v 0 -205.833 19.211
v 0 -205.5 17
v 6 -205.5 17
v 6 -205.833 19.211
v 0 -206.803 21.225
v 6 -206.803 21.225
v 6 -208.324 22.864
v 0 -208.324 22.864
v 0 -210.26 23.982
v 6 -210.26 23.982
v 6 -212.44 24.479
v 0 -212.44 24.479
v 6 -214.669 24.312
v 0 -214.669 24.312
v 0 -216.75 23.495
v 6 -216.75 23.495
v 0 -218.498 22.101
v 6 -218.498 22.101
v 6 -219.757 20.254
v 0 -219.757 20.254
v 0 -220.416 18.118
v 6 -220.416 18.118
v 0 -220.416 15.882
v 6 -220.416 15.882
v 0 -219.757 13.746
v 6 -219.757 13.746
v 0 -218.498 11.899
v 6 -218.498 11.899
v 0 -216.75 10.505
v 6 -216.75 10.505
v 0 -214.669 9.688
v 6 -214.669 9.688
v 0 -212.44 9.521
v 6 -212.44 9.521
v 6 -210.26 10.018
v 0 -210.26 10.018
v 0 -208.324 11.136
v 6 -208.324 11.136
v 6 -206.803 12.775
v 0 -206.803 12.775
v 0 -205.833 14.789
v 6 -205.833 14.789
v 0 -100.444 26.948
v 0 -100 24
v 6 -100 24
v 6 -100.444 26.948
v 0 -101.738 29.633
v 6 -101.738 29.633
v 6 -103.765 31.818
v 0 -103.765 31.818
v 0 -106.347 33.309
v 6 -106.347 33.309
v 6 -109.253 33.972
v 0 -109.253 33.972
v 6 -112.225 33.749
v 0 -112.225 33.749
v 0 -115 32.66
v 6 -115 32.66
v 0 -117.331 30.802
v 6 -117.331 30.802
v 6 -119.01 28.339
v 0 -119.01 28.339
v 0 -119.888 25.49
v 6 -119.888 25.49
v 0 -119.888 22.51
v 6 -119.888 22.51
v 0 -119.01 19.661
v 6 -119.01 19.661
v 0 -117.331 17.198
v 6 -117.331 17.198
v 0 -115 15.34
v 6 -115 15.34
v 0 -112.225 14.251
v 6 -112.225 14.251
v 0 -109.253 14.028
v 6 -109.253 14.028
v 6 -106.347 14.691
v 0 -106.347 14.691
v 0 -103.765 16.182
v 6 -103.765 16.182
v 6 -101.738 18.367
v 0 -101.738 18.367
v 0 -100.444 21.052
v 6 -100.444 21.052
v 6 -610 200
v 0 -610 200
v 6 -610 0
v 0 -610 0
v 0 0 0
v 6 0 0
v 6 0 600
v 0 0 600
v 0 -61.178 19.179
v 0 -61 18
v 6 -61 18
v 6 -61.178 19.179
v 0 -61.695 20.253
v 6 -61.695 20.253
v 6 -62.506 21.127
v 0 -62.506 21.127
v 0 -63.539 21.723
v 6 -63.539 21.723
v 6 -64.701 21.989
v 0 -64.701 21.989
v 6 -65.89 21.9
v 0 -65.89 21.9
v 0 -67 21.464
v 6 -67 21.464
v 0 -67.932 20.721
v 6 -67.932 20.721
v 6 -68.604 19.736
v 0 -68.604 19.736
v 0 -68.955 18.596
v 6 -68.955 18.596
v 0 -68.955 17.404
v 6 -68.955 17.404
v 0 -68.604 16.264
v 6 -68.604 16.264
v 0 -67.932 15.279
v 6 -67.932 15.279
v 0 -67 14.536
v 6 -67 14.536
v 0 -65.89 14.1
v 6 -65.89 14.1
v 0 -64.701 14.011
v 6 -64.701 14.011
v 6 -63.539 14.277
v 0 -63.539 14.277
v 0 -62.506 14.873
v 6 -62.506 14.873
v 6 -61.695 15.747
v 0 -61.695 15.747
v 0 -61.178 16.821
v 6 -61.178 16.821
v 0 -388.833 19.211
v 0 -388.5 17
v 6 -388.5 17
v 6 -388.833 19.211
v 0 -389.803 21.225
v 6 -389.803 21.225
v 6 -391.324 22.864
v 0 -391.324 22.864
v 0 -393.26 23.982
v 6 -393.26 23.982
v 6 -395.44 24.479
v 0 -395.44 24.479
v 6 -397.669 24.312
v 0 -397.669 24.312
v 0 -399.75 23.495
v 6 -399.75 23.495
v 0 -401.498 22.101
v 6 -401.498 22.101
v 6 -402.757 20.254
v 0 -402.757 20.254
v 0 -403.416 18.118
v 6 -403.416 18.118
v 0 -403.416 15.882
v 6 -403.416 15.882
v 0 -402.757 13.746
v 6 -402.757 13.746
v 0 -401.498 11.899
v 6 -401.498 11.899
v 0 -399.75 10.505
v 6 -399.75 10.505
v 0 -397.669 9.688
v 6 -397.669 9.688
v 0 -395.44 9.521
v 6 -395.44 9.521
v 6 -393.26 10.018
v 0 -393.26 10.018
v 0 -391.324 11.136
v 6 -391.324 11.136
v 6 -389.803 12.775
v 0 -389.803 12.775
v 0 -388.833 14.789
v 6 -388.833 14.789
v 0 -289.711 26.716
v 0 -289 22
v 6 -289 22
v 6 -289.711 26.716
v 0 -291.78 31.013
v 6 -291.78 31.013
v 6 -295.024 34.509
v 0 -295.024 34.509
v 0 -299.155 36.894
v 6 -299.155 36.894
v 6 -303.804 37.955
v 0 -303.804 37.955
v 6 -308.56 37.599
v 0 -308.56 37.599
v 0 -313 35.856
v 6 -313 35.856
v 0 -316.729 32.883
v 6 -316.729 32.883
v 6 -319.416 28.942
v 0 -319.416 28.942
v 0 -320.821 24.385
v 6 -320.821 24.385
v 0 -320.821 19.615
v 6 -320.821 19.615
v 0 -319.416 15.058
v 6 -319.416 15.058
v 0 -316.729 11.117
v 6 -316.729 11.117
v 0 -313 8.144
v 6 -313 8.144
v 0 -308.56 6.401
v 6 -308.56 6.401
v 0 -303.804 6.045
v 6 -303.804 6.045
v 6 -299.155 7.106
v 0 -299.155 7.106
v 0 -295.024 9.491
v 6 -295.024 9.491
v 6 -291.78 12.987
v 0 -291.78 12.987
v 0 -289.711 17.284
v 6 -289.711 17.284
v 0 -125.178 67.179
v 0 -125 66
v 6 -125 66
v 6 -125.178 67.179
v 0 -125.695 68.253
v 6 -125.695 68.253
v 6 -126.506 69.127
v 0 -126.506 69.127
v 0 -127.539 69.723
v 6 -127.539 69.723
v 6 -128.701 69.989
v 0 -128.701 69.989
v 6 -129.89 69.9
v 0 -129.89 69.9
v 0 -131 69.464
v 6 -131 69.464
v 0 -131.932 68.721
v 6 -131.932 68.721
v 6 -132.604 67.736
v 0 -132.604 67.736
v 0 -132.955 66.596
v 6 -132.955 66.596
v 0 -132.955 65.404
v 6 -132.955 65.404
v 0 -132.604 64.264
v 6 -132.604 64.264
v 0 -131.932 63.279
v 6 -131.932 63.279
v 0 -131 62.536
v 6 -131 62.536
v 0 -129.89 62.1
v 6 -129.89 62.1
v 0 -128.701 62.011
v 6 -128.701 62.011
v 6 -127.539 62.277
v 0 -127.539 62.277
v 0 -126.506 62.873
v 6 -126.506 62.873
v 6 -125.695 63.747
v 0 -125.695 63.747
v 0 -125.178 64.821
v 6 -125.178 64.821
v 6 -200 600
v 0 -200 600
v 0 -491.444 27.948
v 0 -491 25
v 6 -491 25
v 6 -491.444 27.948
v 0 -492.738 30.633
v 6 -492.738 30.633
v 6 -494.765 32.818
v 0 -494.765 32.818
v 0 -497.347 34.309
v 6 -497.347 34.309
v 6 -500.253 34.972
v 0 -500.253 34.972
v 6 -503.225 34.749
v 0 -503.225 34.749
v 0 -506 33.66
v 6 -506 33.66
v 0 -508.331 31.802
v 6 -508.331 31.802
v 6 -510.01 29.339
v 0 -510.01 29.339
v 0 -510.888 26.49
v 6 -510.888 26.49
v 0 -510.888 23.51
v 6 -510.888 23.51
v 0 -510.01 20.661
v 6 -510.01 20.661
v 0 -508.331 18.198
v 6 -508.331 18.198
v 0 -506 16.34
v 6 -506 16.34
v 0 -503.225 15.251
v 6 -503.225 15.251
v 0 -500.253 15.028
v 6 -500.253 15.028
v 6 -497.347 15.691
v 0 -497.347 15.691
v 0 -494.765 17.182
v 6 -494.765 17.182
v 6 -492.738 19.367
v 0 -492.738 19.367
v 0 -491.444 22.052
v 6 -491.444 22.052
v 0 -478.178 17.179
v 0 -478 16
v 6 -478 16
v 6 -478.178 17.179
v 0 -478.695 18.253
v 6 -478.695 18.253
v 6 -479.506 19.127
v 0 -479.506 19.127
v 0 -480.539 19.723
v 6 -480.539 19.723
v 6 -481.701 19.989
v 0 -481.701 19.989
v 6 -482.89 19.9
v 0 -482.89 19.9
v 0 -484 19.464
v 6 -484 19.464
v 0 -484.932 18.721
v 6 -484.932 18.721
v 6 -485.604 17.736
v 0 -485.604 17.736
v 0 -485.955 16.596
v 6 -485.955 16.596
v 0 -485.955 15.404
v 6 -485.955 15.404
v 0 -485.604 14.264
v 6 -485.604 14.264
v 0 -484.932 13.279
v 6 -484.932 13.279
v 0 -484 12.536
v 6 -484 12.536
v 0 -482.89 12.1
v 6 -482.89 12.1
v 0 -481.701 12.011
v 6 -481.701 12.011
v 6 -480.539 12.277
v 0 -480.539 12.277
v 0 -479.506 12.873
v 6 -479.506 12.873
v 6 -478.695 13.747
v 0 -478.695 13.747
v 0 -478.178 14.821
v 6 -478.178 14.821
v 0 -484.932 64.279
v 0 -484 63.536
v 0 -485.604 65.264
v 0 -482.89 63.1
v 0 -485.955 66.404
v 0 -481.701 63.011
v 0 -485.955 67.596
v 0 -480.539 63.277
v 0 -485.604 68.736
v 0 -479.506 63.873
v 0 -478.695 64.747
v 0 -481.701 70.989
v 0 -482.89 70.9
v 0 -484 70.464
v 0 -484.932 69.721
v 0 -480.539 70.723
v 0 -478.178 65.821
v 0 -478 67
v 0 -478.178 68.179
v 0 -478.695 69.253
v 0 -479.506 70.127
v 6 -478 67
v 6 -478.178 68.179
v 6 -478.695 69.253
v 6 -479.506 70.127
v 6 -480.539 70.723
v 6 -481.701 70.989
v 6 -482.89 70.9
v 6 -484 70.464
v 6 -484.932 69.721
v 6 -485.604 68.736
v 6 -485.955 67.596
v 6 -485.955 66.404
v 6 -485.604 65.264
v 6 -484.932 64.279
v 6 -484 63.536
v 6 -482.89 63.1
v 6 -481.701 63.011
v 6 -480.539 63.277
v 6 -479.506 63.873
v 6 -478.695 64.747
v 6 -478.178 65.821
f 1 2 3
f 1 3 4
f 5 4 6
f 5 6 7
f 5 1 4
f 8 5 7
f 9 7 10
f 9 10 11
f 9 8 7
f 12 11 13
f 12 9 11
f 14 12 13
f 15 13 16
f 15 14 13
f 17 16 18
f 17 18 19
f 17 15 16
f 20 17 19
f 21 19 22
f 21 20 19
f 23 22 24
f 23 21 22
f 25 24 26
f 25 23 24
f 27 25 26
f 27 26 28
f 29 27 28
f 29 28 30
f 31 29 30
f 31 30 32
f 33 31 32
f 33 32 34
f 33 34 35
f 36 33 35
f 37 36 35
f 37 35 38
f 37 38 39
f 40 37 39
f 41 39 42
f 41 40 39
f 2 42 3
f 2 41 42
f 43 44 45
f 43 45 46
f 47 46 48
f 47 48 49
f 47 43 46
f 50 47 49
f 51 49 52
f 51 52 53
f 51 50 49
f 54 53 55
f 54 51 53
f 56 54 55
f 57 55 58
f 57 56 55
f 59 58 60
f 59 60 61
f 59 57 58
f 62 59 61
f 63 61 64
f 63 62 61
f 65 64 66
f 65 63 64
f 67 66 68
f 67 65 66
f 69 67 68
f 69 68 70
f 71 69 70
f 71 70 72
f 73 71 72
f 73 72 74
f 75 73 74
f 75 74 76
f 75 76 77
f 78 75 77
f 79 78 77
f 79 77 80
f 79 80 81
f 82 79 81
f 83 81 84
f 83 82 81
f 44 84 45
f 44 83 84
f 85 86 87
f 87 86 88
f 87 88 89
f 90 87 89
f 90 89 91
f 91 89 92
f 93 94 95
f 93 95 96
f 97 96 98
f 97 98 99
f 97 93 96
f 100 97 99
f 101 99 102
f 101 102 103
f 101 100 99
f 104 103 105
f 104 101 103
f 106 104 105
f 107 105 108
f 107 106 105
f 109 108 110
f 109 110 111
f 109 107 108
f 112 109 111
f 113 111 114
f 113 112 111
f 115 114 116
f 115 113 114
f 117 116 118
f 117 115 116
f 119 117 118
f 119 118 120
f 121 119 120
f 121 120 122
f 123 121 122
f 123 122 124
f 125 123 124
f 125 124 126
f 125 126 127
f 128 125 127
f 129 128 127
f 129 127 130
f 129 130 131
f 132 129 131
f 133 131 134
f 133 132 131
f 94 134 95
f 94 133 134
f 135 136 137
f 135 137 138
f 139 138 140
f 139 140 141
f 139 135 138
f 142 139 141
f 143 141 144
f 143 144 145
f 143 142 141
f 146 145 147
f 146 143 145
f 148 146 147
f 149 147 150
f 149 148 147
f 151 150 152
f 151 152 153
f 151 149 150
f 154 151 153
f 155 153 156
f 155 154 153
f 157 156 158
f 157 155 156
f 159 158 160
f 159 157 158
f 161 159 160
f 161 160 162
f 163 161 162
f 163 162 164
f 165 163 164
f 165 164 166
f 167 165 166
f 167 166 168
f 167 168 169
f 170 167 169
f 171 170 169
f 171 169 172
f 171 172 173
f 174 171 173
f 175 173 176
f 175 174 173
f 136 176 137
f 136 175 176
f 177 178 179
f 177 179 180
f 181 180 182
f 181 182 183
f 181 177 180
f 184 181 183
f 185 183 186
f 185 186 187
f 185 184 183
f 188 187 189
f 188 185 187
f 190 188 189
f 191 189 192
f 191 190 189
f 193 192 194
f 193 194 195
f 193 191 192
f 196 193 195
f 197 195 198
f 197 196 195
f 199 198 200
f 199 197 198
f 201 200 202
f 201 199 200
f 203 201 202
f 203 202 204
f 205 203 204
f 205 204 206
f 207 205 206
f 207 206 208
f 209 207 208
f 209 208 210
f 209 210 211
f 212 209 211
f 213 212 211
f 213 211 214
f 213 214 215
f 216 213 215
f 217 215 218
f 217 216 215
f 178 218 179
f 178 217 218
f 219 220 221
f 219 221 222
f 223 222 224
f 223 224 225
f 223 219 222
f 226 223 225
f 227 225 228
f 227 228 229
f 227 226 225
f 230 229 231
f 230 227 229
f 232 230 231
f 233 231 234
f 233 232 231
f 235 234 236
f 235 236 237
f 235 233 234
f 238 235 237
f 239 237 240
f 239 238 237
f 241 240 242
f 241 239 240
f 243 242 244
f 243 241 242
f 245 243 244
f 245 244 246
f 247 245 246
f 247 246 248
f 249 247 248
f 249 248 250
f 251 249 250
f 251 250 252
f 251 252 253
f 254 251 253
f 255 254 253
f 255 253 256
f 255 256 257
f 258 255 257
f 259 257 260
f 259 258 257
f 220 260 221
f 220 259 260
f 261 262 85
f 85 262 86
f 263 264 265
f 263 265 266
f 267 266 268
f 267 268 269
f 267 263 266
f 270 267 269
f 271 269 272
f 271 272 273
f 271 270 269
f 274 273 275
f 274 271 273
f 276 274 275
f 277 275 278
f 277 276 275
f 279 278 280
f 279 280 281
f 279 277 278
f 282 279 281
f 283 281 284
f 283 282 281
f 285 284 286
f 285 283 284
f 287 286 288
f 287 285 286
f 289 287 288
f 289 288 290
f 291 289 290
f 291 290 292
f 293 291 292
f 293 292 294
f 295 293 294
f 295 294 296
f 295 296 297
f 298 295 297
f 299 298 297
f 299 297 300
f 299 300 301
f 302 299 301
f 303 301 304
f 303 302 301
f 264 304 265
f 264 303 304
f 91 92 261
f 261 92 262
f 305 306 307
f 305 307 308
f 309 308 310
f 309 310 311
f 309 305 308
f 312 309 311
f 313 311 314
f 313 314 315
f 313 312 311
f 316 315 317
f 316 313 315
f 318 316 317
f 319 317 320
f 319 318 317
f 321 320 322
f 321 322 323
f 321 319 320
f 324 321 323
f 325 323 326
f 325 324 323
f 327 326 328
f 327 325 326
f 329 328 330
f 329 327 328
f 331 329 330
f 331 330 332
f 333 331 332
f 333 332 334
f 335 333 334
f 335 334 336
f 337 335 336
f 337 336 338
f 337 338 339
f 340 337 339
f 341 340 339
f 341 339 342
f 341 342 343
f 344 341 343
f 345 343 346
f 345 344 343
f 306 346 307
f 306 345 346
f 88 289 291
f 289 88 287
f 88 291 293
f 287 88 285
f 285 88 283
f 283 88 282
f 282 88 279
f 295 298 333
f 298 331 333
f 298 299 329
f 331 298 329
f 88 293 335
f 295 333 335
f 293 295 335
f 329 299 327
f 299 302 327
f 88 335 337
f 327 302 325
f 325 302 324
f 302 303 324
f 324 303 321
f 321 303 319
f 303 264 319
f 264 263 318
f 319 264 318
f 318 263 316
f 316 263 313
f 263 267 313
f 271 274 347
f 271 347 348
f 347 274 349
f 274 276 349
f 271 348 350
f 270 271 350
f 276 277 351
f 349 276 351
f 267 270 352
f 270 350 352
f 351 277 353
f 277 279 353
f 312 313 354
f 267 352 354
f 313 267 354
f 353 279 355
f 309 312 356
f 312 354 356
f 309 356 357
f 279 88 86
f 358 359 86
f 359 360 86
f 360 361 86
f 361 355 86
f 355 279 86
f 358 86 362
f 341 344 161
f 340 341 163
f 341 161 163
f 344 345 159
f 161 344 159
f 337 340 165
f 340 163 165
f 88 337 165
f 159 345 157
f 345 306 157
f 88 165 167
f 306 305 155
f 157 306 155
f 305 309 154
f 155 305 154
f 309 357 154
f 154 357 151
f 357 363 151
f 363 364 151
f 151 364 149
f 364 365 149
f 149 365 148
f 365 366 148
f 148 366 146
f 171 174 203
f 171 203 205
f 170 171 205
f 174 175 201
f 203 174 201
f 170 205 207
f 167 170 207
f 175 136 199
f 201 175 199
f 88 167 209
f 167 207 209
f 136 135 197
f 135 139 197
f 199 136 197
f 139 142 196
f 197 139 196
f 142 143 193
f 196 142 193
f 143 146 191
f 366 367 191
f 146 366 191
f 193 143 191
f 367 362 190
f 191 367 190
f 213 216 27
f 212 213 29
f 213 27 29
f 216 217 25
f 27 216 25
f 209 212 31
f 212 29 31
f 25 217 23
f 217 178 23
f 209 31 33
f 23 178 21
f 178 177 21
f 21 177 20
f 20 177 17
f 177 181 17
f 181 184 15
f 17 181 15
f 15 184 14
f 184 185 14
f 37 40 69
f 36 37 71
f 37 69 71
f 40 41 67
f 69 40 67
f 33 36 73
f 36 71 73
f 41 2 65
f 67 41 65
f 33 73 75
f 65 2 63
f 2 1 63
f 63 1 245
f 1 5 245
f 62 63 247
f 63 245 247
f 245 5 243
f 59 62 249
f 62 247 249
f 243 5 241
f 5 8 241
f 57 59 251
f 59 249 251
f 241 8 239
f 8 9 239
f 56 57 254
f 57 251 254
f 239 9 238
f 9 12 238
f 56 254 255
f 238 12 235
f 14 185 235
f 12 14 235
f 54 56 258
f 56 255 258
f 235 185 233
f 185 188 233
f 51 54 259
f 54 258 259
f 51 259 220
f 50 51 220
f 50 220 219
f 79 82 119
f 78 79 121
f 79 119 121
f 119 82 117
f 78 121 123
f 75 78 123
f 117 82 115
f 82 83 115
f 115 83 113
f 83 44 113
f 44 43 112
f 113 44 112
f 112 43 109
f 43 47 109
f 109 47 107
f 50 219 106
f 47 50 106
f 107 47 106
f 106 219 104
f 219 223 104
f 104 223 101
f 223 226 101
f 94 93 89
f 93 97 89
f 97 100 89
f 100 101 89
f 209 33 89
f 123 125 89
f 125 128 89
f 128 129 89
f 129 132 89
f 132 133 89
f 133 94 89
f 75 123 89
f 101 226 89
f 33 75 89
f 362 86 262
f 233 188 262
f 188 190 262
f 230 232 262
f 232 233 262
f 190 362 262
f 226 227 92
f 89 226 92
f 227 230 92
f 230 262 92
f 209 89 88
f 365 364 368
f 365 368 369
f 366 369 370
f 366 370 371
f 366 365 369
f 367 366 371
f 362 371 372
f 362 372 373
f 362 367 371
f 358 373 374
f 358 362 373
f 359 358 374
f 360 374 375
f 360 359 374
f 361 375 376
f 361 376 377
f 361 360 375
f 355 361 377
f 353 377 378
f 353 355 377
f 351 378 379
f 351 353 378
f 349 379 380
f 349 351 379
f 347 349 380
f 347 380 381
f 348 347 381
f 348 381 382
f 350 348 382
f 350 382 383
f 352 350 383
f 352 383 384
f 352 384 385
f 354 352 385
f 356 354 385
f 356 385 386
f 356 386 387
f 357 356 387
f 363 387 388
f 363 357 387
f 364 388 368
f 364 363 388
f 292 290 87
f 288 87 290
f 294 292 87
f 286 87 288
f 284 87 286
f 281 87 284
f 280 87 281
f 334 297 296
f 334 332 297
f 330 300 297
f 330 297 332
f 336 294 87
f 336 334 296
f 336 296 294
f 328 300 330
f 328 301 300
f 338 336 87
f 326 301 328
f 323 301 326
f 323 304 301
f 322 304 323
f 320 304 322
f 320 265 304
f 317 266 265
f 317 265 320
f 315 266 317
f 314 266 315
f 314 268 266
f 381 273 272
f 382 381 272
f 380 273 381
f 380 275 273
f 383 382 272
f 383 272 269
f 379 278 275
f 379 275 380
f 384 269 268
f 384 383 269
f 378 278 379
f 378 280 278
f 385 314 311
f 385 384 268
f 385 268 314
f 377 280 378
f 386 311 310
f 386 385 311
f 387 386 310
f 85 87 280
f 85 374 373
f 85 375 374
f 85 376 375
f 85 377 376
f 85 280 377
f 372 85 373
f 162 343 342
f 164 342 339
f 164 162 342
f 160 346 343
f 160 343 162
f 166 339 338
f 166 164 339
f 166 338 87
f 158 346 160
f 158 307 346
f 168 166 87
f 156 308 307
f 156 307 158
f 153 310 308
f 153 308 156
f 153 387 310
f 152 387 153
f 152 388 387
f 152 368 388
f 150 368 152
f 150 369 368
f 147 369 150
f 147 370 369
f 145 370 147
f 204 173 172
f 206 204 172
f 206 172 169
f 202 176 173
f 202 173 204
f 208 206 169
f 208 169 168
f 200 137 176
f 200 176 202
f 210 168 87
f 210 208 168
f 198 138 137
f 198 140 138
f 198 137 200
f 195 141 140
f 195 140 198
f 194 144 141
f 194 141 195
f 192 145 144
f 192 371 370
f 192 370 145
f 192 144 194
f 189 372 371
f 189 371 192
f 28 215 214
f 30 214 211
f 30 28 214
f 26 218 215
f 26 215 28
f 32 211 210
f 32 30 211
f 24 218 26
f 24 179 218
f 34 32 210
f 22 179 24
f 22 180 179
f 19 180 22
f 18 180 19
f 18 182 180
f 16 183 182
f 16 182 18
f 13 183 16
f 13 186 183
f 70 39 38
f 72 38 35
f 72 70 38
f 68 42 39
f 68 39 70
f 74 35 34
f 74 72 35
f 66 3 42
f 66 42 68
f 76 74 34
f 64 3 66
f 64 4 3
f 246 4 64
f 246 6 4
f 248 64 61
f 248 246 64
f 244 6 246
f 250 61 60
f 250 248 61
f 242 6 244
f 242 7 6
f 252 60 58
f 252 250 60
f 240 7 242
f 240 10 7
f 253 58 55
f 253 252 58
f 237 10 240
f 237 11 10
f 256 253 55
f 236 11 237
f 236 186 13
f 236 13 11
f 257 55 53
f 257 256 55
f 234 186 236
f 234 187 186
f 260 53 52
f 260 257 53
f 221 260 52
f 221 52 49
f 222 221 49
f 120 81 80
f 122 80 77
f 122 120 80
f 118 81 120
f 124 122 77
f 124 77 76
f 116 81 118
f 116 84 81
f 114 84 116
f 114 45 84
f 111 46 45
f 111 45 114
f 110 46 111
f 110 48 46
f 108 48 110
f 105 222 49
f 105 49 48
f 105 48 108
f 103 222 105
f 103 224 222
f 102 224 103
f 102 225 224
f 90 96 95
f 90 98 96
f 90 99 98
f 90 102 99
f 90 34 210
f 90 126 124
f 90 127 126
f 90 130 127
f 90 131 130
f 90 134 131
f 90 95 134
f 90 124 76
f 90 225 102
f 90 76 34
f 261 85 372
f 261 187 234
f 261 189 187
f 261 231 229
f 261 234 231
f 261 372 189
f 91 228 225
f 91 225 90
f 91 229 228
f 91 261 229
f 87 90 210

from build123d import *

# Parameters (mm, degrees)
F0_R     = 10
F0_R_2   = 4
F0_R_3   = 7.5
F0_R_4   = 16
F1_DEPTH = 6


with BuildPart() as f1:
    # F0 (on Right) → F1 (new body)
    with BuildSketch(Plane.YZ):
        Polygon((-496, 0), (0, 0), (0, 600), (-200, 600), (-610, 200), (-610, 0), align=None)
        with Locations((-501, 25)):
            Circle(F0_R, mode=Mode.SUBTRACT)
        with Locations((-482, 16)):
            Circle(F0_R_2, mode=Mode.SUBTRACT)
        with Locations((-482, 67)):
            Circle(F0_R_2, mode=Mode.SUBTRACT)
        with Locations((-396, 17)):
            Circle(F0_R_3, mode=Mode.SUBTRACT)
        with Locations((-305, 22)):
            Circle(F0_R_4, mode=Mode.SUBTRACT)
        with Locations((-213, 17)):
            Circle(F0_R_3, mode=Mode.SUBTRACT)
        with Locations((-110, 24)):
            Circle(F0_R, mode=Mode.SUBTRACT)
        with Locations((-129, 66)):
            Circle(F0_R_2, mode=Mode.SUBTRACT)
        with Locations((-65, 18)):
            Circle(F0_R_2, mode=Mode.SUBTRACT)
    extrude(amount=F1_DEPTH)


solid = f1.part
